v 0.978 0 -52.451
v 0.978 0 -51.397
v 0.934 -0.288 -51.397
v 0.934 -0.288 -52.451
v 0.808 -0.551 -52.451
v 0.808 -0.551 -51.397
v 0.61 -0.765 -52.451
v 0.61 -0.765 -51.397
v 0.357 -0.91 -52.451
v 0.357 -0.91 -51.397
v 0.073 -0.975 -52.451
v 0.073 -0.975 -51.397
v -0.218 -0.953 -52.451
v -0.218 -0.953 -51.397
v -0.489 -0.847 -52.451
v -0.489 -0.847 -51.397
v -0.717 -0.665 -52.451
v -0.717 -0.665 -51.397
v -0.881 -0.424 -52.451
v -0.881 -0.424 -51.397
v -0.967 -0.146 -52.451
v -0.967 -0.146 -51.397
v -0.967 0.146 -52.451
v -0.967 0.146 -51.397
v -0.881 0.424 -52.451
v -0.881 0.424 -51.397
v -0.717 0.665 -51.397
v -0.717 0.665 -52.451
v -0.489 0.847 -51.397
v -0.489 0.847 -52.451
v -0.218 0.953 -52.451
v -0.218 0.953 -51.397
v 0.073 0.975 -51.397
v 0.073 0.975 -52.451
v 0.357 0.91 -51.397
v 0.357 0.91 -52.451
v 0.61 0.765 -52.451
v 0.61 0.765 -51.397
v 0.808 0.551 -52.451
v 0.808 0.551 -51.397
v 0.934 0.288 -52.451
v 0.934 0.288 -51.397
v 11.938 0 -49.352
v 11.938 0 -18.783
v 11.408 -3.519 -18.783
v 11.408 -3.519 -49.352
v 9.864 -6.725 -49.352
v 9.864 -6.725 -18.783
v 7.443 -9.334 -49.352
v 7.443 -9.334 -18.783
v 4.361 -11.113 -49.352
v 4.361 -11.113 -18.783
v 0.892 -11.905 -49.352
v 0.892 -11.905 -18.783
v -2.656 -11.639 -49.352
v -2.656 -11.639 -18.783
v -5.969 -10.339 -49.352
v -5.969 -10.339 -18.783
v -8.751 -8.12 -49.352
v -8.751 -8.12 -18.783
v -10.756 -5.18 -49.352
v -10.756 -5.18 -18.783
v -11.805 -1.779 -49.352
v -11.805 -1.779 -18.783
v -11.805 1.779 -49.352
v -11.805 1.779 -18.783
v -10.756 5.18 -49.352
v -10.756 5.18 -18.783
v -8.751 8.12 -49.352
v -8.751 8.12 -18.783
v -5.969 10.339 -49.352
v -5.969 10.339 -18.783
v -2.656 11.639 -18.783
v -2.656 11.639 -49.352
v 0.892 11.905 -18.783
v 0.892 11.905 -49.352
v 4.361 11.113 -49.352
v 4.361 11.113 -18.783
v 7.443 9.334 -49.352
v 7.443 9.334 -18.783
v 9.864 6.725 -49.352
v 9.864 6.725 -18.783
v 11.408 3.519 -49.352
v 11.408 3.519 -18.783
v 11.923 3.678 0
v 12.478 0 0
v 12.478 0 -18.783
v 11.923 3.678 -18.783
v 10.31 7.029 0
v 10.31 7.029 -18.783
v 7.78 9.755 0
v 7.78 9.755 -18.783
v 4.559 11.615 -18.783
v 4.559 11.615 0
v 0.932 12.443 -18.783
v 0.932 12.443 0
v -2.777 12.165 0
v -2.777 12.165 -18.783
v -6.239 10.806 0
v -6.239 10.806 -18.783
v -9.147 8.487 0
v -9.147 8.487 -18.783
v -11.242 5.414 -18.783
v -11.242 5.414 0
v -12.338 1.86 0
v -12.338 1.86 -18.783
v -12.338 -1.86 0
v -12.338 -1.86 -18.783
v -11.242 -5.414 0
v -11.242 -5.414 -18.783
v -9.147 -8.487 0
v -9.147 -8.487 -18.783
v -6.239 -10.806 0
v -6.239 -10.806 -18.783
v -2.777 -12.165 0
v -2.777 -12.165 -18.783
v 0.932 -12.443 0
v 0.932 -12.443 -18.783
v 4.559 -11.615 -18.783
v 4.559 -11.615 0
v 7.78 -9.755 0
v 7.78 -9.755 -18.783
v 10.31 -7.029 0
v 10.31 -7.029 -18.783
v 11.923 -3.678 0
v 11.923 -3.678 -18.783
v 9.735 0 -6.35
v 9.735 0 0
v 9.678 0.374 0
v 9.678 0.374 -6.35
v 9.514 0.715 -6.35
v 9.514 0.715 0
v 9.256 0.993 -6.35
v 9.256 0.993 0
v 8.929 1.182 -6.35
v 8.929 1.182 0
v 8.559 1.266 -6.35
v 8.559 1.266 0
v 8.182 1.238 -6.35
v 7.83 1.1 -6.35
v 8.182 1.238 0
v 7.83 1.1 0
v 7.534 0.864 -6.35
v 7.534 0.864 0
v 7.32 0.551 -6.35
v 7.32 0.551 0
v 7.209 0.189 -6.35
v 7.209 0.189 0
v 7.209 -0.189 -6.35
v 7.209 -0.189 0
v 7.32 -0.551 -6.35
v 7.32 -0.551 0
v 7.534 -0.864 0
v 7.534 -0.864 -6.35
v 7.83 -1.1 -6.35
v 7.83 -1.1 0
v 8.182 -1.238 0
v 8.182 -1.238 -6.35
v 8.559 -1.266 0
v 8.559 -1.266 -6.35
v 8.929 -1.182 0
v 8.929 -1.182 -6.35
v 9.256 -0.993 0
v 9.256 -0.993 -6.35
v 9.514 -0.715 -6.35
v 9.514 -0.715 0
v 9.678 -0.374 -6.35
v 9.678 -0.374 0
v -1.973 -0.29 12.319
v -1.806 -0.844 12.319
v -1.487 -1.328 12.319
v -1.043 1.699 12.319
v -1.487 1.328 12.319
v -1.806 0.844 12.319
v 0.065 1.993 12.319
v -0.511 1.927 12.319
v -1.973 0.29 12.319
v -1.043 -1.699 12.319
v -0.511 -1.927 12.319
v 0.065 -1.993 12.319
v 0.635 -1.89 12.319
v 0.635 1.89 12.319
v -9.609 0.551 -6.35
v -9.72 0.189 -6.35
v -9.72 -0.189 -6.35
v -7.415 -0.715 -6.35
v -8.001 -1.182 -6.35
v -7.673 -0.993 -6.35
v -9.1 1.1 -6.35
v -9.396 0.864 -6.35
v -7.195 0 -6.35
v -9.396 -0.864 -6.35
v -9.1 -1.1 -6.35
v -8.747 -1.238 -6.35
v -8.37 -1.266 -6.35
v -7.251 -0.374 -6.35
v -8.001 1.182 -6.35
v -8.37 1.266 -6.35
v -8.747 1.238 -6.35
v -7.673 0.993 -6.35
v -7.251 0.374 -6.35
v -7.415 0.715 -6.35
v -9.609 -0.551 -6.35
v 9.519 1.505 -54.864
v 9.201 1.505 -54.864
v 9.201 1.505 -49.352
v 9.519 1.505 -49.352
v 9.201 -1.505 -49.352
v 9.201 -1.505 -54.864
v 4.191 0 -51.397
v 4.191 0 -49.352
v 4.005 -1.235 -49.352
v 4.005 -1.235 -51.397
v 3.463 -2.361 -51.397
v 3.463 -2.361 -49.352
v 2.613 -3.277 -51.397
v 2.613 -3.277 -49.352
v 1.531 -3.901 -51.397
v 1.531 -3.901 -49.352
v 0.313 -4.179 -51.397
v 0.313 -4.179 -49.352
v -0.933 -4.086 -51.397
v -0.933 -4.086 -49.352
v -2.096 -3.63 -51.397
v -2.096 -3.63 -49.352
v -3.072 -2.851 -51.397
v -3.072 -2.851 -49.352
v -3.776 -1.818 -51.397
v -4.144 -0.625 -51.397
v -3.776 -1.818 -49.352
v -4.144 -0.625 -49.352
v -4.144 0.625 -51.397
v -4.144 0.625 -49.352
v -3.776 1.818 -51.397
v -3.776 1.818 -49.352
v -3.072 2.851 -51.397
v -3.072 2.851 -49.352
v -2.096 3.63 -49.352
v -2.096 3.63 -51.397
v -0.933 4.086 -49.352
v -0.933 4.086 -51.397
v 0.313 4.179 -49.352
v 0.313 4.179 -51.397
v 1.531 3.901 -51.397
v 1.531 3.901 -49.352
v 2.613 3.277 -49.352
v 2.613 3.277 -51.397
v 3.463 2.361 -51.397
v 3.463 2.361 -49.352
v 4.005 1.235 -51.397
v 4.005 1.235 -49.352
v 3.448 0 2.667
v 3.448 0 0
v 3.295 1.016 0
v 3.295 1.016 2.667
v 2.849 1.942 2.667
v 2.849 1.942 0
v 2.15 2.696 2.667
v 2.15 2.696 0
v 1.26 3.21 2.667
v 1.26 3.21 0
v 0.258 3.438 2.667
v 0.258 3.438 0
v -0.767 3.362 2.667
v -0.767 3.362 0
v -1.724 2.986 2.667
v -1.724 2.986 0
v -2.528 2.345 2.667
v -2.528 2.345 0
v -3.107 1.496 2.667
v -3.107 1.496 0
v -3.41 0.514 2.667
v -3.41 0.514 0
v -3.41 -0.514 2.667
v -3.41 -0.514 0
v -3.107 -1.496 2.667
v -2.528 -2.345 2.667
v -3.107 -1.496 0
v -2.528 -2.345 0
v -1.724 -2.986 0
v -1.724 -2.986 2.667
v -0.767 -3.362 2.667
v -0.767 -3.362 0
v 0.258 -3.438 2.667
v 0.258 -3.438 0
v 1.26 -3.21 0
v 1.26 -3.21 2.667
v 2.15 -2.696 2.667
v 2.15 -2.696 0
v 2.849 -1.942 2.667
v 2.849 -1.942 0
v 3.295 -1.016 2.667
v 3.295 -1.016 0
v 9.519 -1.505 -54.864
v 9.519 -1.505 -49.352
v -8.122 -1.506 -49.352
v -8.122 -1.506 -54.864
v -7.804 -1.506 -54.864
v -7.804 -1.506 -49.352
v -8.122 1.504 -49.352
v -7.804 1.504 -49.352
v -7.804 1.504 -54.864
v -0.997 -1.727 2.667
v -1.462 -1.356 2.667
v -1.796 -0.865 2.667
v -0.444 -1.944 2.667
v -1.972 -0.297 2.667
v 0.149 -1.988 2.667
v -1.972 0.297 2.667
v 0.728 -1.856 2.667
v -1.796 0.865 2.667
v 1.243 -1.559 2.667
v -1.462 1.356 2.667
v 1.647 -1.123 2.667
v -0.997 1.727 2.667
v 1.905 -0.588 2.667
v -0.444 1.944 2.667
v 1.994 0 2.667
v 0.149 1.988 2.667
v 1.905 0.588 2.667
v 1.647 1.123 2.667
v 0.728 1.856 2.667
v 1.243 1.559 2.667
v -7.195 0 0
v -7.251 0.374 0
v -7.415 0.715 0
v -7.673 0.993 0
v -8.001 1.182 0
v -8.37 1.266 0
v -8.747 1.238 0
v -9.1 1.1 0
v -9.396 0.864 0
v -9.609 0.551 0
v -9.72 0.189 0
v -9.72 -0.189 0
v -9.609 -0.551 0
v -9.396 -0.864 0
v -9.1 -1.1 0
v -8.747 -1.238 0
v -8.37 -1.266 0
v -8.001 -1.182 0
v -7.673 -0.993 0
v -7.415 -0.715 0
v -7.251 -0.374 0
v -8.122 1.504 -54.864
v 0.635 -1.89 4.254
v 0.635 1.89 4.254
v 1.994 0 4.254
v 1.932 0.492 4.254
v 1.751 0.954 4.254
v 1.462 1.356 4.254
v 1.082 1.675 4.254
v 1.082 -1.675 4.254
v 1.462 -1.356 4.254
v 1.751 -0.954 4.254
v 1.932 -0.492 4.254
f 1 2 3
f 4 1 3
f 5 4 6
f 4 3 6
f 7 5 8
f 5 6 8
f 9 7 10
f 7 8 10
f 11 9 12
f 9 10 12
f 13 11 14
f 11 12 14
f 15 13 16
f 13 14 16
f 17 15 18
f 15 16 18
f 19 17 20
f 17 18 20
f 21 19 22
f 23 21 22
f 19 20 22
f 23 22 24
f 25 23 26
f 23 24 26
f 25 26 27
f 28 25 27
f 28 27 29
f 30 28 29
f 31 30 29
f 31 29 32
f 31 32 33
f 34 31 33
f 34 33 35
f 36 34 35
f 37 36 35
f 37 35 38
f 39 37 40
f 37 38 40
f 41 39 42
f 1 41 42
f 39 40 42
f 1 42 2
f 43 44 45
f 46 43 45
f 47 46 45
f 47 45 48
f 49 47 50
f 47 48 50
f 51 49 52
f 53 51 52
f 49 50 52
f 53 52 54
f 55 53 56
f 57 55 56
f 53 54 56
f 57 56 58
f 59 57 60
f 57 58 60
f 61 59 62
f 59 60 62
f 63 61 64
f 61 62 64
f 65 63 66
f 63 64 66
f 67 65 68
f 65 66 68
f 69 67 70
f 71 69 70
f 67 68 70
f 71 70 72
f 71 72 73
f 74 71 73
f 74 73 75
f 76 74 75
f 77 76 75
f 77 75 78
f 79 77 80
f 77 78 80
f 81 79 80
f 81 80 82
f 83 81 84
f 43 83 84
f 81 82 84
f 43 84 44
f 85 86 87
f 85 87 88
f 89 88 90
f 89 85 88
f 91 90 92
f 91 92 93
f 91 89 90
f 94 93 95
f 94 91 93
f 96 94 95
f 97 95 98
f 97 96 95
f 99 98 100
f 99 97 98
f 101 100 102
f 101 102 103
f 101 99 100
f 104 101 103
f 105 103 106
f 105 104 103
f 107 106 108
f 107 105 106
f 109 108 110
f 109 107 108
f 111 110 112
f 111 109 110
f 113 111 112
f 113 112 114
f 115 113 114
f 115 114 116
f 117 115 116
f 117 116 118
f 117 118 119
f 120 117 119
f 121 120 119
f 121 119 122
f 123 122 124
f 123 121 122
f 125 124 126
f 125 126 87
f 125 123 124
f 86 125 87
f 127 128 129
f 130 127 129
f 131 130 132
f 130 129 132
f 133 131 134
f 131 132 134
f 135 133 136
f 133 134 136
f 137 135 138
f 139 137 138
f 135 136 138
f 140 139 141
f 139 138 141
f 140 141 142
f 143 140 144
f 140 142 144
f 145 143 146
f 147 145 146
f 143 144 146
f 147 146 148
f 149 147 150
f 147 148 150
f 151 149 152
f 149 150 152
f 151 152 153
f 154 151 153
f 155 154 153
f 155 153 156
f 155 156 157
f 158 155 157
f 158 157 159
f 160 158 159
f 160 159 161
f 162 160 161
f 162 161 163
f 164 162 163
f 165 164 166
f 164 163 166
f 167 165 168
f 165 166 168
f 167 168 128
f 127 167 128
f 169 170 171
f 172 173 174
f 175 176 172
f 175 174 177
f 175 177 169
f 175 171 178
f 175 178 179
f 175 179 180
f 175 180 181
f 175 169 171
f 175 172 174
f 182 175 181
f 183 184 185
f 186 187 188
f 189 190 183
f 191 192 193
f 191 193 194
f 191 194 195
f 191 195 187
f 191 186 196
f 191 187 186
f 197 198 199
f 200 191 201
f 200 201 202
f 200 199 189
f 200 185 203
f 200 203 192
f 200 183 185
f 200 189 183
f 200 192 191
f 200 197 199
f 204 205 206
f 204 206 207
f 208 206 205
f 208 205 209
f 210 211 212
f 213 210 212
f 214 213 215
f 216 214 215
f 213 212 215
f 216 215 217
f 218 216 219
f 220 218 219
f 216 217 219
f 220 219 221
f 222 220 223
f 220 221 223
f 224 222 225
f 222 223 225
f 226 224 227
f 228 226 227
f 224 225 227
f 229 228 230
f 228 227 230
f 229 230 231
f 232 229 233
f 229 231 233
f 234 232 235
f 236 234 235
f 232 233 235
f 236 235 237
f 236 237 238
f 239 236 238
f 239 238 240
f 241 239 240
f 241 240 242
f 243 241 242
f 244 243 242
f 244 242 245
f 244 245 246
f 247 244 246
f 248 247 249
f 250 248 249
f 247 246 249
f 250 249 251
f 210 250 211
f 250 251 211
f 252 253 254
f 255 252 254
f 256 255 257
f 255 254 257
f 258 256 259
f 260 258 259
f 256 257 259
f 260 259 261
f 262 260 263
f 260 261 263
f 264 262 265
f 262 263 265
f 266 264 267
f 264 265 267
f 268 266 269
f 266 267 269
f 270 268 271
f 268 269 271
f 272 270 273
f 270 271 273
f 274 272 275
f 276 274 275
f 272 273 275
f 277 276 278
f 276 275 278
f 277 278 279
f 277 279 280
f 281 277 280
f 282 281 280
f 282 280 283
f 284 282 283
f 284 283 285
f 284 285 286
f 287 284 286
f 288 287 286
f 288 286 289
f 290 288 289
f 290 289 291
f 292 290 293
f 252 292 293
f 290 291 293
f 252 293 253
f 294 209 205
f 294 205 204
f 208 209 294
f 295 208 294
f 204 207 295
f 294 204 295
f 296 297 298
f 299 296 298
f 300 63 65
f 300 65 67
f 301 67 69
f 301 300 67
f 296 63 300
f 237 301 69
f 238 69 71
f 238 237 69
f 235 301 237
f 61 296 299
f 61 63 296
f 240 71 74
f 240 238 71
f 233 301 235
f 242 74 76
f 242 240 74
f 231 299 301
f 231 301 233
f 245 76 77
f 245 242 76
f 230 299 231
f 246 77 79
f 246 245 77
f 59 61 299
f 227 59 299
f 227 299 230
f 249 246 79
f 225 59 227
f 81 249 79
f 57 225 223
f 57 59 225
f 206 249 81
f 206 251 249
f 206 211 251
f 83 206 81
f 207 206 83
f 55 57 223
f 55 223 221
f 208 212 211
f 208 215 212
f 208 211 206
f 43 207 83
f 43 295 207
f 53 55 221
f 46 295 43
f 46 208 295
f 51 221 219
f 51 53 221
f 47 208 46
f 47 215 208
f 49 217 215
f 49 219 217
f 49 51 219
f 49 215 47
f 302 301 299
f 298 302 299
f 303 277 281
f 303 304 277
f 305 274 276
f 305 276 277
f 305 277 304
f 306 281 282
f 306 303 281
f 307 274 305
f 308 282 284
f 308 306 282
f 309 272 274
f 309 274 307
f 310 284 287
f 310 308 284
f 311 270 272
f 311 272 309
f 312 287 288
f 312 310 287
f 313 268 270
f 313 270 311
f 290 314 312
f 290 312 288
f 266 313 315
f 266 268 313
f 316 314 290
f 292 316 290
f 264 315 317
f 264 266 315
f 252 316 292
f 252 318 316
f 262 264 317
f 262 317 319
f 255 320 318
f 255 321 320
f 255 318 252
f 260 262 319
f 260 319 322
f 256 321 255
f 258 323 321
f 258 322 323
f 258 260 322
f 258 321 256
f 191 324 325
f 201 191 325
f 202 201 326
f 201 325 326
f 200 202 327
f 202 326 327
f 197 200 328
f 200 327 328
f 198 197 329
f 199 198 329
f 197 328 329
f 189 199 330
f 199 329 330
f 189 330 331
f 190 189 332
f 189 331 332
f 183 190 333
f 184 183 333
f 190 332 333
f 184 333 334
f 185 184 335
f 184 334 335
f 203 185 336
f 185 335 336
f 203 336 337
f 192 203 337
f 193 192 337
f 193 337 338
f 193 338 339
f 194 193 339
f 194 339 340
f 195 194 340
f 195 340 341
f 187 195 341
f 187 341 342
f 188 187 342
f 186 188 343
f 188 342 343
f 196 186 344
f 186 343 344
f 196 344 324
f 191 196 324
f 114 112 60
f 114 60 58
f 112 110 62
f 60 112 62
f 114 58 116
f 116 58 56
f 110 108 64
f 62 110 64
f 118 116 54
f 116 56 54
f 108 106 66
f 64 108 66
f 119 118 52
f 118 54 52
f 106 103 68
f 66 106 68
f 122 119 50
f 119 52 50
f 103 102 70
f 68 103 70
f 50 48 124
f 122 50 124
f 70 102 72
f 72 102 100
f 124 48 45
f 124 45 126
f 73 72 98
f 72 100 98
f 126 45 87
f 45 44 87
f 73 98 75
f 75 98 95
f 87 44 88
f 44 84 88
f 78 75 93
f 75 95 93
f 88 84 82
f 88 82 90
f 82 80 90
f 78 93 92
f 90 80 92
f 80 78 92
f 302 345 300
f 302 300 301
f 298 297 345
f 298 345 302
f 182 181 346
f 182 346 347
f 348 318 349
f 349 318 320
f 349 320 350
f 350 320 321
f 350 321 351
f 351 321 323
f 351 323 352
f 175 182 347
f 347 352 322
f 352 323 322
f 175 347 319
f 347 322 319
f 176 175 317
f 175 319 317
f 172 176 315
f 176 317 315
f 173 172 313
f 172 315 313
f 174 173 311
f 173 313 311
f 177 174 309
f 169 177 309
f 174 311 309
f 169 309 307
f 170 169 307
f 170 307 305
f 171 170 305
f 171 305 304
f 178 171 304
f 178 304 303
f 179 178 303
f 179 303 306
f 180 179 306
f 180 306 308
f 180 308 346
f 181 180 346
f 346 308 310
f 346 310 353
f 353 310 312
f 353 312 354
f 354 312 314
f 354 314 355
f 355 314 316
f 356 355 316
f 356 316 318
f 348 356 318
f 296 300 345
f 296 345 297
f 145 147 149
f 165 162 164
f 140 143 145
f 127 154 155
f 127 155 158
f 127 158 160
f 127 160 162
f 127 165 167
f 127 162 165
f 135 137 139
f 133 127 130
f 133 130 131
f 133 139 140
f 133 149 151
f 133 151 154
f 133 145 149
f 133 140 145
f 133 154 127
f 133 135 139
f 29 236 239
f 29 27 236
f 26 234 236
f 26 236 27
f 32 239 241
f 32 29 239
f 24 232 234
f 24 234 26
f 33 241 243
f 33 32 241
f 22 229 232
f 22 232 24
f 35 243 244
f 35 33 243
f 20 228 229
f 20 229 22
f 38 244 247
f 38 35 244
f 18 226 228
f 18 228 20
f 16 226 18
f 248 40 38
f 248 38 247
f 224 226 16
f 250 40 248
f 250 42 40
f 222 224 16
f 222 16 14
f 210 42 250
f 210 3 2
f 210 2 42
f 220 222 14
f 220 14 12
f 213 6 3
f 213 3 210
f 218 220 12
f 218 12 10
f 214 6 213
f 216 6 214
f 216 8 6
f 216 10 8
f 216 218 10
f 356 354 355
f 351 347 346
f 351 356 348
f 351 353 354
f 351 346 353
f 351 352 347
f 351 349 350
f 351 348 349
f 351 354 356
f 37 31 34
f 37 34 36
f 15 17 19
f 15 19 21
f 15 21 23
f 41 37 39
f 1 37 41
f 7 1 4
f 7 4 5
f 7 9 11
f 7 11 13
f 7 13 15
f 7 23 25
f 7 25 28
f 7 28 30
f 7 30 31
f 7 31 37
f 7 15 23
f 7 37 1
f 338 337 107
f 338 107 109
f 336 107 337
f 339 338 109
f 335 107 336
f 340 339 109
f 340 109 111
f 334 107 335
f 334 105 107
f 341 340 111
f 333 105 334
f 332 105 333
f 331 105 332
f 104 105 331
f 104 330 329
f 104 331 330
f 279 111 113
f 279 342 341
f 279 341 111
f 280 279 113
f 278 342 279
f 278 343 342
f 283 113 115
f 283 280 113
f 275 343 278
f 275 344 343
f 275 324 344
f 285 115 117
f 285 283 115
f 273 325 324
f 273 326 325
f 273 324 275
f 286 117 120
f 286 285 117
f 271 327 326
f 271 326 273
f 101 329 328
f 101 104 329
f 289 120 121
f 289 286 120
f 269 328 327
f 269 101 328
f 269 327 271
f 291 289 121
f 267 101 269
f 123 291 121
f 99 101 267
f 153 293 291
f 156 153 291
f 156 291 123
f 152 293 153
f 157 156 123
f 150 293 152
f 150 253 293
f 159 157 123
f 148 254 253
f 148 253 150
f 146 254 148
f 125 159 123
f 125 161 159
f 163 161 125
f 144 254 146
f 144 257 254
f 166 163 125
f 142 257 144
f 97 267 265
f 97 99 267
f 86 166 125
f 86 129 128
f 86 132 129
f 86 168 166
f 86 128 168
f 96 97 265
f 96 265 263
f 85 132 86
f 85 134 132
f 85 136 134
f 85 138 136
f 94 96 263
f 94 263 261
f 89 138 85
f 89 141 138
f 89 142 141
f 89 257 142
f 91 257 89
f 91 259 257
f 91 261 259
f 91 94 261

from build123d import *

# Parameters (mm, degrees)
SKETCH_R        = 12.47775
PAD_DEPTH       = 18.7833
SKETCH001_R     = 3.44805
PAD001_DEPTH    = 2.667
SKETCH002_R     = 1.9939
PAD002_DEPTH    = 9.652
SKETCH003_W     = 1.605508
SKETCH003_H     = 4.122735
POCKET_DEPTH    = 8.0645
SKETCH004_R     = 1.27
POCKET001_DEPTH = 6.35
SKETCH005_R     = 11.938
PAD003_DEPTH    = 30.5689
SKETCH006_R     = 4.191
PAD004_DEPTH    = 2.0447
SKETCH007_W     = 0.3175
SKETCH007_H     = 3.0099
PAD005_DEPTH    = 5.5118
SKETCH008_R     = 0.9779
PAD006_DEPTH    = 1.0541


with BuildPart() as part:
    # Sketch → Pad (new body)
    with BuildSketch(Plane.XY):
        Circle(SKETCH_R)
    extrude(amount=-PAD_DEPTH)

    # Sketch001 → Pad001 (new body)
    with BuildSketch(Plane.XY):
        Circle(SKETCH001_R)
    extrude(amount=PAD001_DEPTH)

    # Sketch002 → Pad002 (new body)
    with BuildSketch(Plane.XY.offset(2.667)):
        Circle(SKETCH002_R)
    extrude(amount=PAD002_DEPTH)

    # Sketch003 → Pocket (cut)
    with BuildSketch(Plane.XY.offset(12.319)):
        with Locations((1.437754, -0.02757)):
            Rectangle(SKETCH003_W, SKETCH003_H)
    extrude(amount=-POCKET_DEPTH, mode=Mode.SUBTRACT)

    # Sketch004 → Pocket001 (cut)
    with BuildSketch(Plane.XY):
        with Locations((8.46455, 0)):
            Circle(SKETCH004_R)
        with Locations((-8.46455, 0)):
            Circle(SKETCH004_R)
    extrude(amount=-POCKET001_DEPTH, mode=Mode.SUBTRACT)

    # Sketch005 → Pad003 (new body)
    with BuildSketch(Plane(origin=(0, 0, -18.7833), x_dir=(1, 0, 0), z_dir=(0, 0, -1))):
        Circle(SKETCH005_R)
    extrude(amount=PAD003_DEPTH)

    # Sketch006 → Pad004 (new body)
    with BuildSketch(Plane(origin=(0, 0, -49.3522), x_dir=(1, 0, 0), z_dir=(0, 0, -1))):
        Circle(SKETCH006_R)
    extrude(amount=PAD004_DEPTH)

    # Sketch007 → Pad005 (new body)
    with BuildSketch(Plane(origin=(0, 0, -49.3522), x_dir=(1, 0, 0), z_dir=(0, 0, -1))):
        with Locations((9.3599, 0)):
            Rectangle(SKETCH007_W, SKETCH007_H)
        with Locations((-7.9629, 0.00127)):
            Rectangle(SKETCH007_W, SKETCH007_H)
    extrude(amount=PAD005_DEPTH)

    # Sketch008 → Pad006 (new body)
    with BuildSketch(Plane(origin=(0, 0, -51.3969), x_dir=(1, 0, 0), z_dir=(0, 0, -1))):
        Circle(SKETCH008_R)
    extrude(amount=PAD006_DEPTH)


solid = part.part
